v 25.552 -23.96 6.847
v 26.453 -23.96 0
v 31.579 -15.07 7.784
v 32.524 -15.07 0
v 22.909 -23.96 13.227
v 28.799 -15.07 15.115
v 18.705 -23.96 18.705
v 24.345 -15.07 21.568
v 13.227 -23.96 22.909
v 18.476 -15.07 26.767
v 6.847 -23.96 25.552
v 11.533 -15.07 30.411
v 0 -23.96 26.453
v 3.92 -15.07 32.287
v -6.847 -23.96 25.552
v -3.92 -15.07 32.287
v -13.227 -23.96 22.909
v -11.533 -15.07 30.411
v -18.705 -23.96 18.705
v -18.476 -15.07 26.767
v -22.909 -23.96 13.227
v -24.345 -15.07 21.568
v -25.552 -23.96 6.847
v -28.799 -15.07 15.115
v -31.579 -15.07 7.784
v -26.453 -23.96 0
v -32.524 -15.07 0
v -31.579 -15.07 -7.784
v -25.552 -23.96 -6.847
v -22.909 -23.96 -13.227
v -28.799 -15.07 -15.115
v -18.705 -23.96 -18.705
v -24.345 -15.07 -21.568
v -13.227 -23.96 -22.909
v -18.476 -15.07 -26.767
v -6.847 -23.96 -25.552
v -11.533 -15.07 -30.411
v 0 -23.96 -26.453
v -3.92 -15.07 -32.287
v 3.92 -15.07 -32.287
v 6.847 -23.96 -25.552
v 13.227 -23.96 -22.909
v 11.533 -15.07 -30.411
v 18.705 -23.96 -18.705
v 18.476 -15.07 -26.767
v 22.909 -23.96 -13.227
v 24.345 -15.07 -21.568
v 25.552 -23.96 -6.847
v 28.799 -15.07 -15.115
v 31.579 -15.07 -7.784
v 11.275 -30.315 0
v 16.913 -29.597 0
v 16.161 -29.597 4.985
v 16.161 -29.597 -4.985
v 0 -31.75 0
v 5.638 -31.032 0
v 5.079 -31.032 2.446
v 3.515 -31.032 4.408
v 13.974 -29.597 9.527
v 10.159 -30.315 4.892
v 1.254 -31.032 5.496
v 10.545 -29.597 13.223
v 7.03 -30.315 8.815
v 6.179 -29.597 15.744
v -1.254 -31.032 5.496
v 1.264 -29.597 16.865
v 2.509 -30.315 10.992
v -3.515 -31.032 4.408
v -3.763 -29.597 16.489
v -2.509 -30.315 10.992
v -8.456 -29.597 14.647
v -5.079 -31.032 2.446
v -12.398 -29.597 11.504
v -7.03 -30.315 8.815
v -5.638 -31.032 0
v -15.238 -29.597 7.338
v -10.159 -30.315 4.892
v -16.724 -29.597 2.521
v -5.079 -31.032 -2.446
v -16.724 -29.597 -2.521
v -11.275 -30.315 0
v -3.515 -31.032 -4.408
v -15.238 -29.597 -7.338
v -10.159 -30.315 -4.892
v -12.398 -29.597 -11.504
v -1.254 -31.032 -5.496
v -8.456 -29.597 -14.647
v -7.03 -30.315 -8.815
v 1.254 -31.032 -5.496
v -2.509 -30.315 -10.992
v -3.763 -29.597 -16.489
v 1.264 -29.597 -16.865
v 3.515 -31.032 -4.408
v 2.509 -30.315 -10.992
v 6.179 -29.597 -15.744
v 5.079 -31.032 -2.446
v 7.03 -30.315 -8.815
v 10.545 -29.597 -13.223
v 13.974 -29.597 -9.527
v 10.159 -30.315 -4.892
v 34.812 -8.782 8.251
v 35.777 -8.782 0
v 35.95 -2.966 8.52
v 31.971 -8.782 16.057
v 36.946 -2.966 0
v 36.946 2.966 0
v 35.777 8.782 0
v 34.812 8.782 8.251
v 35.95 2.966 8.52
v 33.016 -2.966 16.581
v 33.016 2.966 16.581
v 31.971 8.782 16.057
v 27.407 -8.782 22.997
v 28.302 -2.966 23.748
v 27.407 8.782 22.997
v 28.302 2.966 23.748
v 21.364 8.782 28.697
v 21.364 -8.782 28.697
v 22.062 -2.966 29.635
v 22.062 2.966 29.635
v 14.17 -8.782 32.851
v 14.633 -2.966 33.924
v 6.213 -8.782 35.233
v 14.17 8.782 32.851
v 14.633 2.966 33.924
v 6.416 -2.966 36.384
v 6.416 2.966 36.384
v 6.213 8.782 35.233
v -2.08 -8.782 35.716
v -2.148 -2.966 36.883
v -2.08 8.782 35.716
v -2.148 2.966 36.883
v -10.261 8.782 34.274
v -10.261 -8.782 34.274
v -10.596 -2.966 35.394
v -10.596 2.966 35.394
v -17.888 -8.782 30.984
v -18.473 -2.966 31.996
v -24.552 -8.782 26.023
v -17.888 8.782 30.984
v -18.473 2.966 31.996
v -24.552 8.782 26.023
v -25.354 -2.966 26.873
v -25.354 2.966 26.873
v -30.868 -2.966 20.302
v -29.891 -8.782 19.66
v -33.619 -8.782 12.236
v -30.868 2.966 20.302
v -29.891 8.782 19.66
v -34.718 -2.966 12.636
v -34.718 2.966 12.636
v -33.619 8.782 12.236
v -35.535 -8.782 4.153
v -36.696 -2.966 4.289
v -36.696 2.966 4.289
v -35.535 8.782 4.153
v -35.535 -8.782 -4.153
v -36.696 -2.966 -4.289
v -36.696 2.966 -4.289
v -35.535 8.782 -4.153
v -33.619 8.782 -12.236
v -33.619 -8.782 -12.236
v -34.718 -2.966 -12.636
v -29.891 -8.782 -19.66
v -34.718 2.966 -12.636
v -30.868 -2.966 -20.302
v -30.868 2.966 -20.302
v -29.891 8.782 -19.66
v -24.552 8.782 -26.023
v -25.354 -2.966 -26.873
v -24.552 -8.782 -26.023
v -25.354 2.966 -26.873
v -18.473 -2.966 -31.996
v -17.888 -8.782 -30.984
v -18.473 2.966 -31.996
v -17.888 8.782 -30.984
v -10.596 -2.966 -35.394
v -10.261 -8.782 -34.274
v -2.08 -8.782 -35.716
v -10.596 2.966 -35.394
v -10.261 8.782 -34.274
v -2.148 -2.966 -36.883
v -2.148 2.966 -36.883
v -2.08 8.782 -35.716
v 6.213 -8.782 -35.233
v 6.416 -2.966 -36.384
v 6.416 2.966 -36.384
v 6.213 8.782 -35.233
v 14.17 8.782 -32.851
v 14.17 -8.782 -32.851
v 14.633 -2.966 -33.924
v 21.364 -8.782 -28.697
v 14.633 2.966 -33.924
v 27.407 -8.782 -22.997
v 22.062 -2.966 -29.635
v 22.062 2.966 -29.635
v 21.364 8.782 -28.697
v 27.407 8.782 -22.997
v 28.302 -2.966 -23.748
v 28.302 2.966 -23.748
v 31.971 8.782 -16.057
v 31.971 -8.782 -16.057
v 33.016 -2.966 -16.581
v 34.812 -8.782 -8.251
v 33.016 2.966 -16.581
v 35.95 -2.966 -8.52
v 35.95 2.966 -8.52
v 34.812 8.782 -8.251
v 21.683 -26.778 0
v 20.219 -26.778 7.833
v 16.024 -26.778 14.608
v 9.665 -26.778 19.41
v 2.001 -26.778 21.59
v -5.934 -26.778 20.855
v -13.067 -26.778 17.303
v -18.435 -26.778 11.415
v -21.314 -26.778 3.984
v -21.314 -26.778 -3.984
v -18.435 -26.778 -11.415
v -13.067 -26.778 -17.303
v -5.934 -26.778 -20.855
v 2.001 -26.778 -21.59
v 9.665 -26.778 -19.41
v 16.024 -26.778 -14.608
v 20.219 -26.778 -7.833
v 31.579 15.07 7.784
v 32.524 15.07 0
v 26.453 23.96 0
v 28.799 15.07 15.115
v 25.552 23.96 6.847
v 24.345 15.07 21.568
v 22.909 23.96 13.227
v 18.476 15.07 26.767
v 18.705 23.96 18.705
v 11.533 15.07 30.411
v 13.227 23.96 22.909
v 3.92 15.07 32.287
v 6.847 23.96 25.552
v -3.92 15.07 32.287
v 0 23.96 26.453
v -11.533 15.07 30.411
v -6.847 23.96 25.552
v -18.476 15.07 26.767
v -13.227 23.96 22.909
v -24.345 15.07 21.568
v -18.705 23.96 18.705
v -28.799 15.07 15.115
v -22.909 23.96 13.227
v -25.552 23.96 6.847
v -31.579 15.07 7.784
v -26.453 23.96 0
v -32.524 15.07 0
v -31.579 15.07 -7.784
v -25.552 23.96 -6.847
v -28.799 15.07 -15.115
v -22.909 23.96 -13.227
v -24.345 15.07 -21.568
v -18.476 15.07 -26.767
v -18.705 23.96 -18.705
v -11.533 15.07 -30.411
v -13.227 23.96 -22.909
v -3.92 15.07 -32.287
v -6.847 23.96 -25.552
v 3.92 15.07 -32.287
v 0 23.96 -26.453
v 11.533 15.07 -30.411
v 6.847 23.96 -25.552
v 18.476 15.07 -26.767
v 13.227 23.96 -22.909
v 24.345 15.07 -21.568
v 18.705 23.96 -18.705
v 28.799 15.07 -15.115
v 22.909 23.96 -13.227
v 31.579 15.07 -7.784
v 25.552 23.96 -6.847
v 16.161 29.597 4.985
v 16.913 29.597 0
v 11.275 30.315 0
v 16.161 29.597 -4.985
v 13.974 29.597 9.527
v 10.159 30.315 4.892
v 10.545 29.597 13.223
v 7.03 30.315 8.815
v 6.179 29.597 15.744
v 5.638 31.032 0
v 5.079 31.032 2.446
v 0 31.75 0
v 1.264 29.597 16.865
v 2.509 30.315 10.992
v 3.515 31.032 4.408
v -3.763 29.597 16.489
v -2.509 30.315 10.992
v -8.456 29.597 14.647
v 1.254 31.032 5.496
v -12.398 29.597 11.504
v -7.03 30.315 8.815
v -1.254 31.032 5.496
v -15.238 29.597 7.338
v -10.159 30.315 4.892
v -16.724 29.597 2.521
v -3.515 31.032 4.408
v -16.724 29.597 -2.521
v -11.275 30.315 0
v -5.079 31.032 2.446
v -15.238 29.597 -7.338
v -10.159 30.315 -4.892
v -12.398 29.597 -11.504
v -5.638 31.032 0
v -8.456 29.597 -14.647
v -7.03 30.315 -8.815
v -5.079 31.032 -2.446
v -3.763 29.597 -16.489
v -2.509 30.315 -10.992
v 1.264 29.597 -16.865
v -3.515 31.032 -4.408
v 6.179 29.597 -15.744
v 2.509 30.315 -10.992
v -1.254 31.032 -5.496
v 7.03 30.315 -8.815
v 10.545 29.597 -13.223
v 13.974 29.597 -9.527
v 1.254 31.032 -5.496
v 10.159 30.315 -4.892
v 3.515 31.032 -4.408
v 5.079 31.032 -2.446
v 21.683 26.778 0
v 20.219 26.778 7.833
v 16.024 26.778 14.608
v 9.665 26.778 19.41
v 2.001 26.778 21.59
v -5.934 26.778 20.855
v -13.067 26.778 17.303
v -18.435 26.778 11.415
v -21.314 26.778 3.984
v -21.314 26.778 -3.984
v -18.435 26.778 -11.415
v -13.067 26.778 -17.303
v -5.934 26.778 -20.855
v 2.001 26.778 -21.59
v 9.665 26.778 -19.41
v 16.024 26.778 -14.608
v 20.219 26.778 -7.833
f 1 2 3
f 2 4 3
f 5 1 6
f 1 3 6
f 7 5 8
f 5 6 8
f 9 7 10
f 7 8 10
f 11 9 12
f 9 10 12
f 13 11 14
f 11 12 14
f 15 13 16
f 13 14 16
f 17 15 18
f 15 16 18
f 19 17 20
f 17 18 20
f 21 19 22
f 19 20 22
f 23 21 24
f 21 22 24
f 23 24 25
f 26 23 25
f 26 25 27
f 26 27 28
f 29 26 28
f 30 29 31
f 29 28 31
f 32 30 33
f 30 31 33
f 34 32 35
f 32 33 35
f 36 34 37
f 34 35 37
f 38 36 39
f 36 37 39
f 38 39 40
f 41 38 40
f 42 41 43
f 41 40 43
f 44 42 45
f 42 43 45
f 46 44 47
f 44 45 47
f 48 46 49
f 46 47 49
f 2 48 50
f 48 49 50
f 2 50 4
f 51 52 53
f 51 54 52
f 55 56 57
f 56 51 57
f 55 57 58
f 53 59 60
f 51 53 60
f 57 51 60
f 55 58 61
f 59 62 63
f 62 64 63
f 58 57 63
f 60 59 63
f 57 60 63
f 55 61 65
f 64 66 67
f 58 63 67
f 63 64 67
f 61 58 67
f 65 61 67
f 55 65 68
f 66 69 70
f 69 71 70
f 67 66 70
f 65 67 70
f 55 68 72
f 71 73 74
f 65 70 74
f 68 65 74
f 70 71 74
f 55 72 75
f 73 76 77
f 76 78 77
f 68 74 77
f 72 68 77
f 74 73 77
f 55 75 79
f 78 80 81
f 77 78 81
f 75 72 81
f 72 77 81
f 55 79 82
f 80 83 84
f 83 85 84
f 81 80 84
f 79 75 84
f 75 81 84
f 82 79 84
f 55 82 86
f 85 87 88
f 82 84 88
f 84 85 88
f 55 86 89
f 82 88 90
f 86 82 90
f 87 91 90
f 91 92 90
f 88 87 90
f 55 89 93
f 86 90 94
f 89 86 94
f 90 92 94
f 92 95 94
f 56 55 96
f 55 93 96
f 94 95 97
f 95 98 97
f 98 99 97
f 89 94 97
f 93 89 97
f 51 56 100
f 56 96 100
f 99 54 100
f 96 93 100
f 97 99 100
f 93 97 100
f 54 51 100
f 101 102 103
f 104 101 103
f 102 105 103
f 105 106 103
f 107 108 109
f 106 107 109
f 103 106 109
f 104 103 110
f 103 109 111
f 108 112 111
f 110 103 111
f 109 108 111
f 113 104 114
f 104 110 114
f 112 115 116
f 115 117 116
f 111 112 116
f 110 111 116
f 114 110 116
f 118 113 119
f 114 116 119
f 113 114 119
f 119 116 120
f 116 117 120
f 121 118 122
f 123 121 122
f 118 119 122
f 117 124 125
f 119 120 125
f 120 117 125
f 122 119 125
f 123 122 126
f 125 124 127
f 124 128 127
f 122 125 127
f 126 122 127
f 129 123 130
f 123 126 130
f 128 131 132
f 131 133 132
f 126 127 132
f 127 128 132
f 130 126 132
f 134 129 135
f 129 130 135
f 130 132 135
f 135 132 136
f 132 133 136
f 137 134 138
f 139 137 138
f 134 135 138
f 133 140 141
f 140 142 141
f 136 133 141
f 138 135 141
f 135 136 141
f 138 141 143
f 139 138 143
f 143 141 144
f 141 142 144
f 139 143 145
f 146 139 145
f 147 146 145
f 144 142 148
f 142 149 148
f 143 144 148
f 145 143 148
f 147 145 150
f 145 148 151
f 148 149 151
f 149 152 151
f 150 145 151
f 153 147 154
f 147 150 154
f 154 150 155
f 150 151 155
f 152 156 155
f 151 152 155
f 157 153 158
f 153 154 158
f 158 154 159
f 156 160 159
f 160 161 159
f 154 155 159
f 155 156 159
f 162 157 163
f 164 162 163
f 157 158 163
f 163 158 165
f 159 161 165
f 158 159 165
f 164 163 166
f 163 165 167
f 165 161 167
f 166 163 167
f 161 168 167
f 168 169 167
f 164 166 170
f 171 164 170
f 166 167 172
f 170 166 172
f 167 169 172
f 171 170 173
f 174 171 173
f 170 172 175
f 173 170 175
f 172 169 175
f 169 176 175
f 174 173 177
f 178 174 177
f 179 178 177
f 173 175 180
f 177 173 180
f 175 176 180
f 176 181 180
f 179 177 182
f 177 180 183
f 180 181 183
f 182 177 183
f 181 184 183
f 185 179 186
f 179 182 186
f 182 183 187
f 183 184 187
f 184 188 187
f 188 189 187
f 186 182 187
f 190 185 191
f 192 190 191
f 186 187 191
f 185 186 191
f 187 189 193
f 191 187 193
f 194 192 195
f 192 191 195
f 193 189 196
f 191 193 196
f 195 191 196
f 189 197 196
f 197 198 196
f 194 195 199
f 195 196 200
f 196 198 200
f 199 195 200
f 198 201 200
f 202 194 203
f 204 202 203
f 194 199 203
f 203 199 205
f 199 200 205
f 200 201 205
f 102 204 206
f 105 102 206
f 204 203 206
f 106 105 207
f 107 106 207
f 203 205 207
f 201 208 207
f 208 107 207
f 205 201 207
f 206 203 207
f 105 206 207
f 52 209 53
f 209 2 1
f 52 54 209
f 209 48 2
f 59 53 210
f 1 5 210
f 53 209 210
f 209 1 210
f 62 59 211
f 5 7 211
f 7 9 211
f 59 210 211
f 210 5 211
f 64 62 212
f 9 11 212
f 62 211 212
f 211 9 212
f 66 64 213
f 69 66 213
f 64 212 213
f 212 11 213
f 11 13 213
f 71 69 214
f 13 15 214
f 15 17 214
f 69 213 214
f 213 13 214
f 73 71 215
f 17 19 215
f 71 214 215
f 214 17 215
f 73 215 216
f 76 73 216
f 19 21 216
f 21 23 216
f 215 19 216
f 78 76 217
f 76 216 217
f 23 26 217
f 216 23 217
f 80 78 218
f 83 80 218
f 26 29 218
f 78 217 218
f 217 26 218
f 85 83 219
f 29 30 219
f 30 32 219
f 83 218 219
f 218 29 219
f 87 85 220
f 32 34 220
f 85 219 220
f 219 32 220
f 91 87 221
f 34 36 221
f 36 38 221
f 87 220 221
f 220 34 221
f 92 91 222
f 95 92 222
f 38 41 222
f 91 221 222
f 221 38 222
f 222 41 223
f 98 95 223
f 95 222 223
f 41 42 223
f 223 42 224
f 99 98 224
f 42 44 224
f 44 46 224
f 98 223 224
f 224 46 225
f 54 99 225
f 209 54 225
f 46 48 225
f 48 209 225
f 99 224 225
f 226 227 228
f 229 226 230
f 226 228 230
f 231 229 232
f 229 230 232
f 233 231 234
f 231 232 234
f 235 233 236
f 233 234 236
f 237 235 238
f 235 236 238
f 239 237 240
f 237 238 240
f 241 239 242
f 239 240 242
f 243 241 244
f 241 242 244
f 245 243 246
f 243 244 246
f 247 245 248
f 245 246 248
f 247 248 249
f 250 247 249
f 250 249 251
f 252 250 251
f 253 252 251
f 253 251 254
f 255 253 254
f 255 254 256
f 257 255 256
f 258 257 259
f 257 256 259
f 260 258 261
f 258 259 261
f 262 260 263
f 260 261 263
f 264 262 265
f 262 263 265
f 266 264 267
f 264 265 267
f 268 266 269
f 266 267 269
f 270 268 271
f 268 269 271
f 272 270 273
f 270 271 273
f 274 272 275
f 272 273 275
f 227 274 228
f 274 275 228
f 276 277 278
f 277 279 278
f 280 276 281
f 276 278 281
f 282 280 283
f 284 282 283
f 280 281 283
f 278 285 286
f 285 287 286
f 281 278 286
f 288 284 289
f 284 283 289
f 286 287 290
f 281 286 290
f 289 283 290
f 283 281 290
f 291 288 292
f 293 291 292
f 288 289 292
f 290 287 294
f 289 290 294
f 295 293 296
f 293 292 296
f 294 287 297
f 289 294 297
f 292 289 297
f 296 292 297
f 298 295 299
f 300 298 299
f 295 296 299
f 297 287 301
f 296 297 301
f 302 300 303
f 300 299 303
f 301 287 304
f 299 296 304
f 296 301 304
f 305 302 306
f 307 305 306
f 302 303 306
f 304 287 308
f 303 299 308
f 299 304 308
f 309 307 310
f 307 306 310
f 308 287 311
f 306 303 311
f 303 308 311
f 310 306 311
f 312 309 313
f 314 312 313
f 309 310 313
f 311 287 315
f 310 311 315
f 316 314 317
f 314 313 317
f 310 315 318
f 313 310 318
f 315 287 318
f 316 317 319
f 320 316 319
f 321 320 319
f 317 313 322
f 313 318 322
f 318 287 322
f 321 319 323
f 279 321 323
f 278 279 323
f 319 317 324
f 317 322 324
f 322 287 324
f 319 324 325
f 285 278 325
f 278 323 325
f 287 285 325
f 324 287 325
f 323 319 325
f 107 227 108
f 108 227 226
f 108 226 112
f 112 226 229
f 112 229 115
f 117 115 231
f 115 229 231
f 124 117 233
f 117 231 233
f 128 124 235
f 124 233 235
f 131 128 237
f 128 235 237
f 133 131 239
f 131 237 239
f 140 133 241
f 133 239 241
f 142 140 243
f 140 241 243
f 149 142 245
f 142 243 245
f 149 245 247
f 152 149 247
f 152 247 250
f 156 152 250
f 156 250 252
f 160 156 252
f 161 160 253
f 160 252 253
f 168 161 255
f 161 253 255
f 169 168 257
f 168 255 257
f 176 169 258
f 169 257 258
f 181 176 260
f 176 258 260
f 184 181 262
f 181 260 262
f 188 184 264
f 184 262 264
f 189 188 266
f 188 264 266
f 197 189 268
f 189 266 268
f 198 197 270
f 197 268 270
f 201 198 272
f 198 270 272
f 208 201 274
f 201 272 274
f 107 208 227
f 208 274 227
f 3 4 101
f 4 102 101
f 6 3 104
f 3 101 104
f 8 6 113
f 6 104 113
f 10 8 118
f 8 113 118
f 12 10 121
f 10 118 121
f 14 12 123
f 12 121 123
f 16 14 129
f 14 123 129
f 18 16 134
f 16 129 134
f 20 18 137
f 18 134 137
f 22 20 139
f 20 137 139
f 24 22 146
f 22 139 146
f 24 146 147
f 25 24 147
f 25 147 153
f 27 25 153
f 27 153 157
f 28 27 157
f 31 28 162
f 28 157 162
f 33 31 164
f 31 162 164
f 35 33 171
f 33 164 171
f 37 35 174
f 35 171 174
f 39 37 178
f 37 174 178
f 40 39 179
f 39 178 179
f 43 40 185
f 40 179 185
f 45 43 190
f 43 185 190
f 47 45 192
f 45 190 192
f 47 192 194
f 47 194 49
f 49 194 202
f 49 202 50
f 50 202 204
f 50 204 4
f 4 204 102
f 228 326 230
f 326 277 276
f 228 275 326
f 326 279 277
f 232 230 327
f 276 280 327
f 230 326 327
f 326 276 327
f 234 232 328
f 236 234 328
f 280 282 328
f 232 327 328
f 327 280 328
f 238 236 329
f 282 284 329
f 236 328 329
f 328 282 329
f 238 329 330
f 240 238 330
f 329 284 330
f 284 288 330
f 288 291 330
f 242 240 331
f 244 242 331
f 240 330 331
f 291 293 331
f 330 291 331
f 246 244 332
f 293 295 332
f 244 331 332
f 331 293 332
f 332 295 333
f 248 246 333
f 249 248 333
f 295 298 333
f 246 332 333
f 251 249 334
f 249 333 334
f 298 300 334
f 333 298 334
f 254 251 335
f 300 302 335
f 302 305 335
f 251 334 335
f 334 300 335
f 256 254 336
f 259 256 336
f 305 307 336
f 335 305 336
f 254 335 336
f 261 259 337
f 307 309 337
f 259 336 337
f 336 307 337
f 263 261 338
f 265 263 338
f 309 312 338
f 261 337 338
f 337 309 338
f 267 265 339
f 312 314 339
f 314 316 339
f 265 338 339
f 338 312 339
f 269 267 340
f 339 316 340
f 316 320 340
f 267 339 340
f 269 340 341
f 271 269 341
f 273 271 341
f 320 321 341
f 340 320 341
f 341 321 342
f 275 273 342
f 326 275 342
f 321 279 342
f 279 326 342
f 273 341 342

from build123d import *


with BuildPart() as f1:
    # F0 (on Top) → F1 (revolve)
    with BuildSketch(Plane.XY):
        Polygon((16.912684, 29.597197), (0, 31.75), (0, 0), (35.776827, 0), (35.776827, 8.781586), (32.524388, 15.069634), (26.453173, 23.959635), align=None)
        Polygon((35.776827, 0), (0, 0), (0, -31.75), (16.912684, -29.597197), (26.453173, -23.959635), (32.524388, -15.069634), (35.776827, -8.781586), align=None)
        with BuildLine():
            Line((35.776827, 8.781586), (35.776827, 0))
            Line((35.776827, 0), (35.776827, -8.781586))
            ThreePointArc((35.776827, -8.781586), (37.092955, 0), (35.776827, 8.781586))
        make_face()
    revolve(axis=Axis((0, 0, 0), (0, -1, 0)))


solid = f1.part
